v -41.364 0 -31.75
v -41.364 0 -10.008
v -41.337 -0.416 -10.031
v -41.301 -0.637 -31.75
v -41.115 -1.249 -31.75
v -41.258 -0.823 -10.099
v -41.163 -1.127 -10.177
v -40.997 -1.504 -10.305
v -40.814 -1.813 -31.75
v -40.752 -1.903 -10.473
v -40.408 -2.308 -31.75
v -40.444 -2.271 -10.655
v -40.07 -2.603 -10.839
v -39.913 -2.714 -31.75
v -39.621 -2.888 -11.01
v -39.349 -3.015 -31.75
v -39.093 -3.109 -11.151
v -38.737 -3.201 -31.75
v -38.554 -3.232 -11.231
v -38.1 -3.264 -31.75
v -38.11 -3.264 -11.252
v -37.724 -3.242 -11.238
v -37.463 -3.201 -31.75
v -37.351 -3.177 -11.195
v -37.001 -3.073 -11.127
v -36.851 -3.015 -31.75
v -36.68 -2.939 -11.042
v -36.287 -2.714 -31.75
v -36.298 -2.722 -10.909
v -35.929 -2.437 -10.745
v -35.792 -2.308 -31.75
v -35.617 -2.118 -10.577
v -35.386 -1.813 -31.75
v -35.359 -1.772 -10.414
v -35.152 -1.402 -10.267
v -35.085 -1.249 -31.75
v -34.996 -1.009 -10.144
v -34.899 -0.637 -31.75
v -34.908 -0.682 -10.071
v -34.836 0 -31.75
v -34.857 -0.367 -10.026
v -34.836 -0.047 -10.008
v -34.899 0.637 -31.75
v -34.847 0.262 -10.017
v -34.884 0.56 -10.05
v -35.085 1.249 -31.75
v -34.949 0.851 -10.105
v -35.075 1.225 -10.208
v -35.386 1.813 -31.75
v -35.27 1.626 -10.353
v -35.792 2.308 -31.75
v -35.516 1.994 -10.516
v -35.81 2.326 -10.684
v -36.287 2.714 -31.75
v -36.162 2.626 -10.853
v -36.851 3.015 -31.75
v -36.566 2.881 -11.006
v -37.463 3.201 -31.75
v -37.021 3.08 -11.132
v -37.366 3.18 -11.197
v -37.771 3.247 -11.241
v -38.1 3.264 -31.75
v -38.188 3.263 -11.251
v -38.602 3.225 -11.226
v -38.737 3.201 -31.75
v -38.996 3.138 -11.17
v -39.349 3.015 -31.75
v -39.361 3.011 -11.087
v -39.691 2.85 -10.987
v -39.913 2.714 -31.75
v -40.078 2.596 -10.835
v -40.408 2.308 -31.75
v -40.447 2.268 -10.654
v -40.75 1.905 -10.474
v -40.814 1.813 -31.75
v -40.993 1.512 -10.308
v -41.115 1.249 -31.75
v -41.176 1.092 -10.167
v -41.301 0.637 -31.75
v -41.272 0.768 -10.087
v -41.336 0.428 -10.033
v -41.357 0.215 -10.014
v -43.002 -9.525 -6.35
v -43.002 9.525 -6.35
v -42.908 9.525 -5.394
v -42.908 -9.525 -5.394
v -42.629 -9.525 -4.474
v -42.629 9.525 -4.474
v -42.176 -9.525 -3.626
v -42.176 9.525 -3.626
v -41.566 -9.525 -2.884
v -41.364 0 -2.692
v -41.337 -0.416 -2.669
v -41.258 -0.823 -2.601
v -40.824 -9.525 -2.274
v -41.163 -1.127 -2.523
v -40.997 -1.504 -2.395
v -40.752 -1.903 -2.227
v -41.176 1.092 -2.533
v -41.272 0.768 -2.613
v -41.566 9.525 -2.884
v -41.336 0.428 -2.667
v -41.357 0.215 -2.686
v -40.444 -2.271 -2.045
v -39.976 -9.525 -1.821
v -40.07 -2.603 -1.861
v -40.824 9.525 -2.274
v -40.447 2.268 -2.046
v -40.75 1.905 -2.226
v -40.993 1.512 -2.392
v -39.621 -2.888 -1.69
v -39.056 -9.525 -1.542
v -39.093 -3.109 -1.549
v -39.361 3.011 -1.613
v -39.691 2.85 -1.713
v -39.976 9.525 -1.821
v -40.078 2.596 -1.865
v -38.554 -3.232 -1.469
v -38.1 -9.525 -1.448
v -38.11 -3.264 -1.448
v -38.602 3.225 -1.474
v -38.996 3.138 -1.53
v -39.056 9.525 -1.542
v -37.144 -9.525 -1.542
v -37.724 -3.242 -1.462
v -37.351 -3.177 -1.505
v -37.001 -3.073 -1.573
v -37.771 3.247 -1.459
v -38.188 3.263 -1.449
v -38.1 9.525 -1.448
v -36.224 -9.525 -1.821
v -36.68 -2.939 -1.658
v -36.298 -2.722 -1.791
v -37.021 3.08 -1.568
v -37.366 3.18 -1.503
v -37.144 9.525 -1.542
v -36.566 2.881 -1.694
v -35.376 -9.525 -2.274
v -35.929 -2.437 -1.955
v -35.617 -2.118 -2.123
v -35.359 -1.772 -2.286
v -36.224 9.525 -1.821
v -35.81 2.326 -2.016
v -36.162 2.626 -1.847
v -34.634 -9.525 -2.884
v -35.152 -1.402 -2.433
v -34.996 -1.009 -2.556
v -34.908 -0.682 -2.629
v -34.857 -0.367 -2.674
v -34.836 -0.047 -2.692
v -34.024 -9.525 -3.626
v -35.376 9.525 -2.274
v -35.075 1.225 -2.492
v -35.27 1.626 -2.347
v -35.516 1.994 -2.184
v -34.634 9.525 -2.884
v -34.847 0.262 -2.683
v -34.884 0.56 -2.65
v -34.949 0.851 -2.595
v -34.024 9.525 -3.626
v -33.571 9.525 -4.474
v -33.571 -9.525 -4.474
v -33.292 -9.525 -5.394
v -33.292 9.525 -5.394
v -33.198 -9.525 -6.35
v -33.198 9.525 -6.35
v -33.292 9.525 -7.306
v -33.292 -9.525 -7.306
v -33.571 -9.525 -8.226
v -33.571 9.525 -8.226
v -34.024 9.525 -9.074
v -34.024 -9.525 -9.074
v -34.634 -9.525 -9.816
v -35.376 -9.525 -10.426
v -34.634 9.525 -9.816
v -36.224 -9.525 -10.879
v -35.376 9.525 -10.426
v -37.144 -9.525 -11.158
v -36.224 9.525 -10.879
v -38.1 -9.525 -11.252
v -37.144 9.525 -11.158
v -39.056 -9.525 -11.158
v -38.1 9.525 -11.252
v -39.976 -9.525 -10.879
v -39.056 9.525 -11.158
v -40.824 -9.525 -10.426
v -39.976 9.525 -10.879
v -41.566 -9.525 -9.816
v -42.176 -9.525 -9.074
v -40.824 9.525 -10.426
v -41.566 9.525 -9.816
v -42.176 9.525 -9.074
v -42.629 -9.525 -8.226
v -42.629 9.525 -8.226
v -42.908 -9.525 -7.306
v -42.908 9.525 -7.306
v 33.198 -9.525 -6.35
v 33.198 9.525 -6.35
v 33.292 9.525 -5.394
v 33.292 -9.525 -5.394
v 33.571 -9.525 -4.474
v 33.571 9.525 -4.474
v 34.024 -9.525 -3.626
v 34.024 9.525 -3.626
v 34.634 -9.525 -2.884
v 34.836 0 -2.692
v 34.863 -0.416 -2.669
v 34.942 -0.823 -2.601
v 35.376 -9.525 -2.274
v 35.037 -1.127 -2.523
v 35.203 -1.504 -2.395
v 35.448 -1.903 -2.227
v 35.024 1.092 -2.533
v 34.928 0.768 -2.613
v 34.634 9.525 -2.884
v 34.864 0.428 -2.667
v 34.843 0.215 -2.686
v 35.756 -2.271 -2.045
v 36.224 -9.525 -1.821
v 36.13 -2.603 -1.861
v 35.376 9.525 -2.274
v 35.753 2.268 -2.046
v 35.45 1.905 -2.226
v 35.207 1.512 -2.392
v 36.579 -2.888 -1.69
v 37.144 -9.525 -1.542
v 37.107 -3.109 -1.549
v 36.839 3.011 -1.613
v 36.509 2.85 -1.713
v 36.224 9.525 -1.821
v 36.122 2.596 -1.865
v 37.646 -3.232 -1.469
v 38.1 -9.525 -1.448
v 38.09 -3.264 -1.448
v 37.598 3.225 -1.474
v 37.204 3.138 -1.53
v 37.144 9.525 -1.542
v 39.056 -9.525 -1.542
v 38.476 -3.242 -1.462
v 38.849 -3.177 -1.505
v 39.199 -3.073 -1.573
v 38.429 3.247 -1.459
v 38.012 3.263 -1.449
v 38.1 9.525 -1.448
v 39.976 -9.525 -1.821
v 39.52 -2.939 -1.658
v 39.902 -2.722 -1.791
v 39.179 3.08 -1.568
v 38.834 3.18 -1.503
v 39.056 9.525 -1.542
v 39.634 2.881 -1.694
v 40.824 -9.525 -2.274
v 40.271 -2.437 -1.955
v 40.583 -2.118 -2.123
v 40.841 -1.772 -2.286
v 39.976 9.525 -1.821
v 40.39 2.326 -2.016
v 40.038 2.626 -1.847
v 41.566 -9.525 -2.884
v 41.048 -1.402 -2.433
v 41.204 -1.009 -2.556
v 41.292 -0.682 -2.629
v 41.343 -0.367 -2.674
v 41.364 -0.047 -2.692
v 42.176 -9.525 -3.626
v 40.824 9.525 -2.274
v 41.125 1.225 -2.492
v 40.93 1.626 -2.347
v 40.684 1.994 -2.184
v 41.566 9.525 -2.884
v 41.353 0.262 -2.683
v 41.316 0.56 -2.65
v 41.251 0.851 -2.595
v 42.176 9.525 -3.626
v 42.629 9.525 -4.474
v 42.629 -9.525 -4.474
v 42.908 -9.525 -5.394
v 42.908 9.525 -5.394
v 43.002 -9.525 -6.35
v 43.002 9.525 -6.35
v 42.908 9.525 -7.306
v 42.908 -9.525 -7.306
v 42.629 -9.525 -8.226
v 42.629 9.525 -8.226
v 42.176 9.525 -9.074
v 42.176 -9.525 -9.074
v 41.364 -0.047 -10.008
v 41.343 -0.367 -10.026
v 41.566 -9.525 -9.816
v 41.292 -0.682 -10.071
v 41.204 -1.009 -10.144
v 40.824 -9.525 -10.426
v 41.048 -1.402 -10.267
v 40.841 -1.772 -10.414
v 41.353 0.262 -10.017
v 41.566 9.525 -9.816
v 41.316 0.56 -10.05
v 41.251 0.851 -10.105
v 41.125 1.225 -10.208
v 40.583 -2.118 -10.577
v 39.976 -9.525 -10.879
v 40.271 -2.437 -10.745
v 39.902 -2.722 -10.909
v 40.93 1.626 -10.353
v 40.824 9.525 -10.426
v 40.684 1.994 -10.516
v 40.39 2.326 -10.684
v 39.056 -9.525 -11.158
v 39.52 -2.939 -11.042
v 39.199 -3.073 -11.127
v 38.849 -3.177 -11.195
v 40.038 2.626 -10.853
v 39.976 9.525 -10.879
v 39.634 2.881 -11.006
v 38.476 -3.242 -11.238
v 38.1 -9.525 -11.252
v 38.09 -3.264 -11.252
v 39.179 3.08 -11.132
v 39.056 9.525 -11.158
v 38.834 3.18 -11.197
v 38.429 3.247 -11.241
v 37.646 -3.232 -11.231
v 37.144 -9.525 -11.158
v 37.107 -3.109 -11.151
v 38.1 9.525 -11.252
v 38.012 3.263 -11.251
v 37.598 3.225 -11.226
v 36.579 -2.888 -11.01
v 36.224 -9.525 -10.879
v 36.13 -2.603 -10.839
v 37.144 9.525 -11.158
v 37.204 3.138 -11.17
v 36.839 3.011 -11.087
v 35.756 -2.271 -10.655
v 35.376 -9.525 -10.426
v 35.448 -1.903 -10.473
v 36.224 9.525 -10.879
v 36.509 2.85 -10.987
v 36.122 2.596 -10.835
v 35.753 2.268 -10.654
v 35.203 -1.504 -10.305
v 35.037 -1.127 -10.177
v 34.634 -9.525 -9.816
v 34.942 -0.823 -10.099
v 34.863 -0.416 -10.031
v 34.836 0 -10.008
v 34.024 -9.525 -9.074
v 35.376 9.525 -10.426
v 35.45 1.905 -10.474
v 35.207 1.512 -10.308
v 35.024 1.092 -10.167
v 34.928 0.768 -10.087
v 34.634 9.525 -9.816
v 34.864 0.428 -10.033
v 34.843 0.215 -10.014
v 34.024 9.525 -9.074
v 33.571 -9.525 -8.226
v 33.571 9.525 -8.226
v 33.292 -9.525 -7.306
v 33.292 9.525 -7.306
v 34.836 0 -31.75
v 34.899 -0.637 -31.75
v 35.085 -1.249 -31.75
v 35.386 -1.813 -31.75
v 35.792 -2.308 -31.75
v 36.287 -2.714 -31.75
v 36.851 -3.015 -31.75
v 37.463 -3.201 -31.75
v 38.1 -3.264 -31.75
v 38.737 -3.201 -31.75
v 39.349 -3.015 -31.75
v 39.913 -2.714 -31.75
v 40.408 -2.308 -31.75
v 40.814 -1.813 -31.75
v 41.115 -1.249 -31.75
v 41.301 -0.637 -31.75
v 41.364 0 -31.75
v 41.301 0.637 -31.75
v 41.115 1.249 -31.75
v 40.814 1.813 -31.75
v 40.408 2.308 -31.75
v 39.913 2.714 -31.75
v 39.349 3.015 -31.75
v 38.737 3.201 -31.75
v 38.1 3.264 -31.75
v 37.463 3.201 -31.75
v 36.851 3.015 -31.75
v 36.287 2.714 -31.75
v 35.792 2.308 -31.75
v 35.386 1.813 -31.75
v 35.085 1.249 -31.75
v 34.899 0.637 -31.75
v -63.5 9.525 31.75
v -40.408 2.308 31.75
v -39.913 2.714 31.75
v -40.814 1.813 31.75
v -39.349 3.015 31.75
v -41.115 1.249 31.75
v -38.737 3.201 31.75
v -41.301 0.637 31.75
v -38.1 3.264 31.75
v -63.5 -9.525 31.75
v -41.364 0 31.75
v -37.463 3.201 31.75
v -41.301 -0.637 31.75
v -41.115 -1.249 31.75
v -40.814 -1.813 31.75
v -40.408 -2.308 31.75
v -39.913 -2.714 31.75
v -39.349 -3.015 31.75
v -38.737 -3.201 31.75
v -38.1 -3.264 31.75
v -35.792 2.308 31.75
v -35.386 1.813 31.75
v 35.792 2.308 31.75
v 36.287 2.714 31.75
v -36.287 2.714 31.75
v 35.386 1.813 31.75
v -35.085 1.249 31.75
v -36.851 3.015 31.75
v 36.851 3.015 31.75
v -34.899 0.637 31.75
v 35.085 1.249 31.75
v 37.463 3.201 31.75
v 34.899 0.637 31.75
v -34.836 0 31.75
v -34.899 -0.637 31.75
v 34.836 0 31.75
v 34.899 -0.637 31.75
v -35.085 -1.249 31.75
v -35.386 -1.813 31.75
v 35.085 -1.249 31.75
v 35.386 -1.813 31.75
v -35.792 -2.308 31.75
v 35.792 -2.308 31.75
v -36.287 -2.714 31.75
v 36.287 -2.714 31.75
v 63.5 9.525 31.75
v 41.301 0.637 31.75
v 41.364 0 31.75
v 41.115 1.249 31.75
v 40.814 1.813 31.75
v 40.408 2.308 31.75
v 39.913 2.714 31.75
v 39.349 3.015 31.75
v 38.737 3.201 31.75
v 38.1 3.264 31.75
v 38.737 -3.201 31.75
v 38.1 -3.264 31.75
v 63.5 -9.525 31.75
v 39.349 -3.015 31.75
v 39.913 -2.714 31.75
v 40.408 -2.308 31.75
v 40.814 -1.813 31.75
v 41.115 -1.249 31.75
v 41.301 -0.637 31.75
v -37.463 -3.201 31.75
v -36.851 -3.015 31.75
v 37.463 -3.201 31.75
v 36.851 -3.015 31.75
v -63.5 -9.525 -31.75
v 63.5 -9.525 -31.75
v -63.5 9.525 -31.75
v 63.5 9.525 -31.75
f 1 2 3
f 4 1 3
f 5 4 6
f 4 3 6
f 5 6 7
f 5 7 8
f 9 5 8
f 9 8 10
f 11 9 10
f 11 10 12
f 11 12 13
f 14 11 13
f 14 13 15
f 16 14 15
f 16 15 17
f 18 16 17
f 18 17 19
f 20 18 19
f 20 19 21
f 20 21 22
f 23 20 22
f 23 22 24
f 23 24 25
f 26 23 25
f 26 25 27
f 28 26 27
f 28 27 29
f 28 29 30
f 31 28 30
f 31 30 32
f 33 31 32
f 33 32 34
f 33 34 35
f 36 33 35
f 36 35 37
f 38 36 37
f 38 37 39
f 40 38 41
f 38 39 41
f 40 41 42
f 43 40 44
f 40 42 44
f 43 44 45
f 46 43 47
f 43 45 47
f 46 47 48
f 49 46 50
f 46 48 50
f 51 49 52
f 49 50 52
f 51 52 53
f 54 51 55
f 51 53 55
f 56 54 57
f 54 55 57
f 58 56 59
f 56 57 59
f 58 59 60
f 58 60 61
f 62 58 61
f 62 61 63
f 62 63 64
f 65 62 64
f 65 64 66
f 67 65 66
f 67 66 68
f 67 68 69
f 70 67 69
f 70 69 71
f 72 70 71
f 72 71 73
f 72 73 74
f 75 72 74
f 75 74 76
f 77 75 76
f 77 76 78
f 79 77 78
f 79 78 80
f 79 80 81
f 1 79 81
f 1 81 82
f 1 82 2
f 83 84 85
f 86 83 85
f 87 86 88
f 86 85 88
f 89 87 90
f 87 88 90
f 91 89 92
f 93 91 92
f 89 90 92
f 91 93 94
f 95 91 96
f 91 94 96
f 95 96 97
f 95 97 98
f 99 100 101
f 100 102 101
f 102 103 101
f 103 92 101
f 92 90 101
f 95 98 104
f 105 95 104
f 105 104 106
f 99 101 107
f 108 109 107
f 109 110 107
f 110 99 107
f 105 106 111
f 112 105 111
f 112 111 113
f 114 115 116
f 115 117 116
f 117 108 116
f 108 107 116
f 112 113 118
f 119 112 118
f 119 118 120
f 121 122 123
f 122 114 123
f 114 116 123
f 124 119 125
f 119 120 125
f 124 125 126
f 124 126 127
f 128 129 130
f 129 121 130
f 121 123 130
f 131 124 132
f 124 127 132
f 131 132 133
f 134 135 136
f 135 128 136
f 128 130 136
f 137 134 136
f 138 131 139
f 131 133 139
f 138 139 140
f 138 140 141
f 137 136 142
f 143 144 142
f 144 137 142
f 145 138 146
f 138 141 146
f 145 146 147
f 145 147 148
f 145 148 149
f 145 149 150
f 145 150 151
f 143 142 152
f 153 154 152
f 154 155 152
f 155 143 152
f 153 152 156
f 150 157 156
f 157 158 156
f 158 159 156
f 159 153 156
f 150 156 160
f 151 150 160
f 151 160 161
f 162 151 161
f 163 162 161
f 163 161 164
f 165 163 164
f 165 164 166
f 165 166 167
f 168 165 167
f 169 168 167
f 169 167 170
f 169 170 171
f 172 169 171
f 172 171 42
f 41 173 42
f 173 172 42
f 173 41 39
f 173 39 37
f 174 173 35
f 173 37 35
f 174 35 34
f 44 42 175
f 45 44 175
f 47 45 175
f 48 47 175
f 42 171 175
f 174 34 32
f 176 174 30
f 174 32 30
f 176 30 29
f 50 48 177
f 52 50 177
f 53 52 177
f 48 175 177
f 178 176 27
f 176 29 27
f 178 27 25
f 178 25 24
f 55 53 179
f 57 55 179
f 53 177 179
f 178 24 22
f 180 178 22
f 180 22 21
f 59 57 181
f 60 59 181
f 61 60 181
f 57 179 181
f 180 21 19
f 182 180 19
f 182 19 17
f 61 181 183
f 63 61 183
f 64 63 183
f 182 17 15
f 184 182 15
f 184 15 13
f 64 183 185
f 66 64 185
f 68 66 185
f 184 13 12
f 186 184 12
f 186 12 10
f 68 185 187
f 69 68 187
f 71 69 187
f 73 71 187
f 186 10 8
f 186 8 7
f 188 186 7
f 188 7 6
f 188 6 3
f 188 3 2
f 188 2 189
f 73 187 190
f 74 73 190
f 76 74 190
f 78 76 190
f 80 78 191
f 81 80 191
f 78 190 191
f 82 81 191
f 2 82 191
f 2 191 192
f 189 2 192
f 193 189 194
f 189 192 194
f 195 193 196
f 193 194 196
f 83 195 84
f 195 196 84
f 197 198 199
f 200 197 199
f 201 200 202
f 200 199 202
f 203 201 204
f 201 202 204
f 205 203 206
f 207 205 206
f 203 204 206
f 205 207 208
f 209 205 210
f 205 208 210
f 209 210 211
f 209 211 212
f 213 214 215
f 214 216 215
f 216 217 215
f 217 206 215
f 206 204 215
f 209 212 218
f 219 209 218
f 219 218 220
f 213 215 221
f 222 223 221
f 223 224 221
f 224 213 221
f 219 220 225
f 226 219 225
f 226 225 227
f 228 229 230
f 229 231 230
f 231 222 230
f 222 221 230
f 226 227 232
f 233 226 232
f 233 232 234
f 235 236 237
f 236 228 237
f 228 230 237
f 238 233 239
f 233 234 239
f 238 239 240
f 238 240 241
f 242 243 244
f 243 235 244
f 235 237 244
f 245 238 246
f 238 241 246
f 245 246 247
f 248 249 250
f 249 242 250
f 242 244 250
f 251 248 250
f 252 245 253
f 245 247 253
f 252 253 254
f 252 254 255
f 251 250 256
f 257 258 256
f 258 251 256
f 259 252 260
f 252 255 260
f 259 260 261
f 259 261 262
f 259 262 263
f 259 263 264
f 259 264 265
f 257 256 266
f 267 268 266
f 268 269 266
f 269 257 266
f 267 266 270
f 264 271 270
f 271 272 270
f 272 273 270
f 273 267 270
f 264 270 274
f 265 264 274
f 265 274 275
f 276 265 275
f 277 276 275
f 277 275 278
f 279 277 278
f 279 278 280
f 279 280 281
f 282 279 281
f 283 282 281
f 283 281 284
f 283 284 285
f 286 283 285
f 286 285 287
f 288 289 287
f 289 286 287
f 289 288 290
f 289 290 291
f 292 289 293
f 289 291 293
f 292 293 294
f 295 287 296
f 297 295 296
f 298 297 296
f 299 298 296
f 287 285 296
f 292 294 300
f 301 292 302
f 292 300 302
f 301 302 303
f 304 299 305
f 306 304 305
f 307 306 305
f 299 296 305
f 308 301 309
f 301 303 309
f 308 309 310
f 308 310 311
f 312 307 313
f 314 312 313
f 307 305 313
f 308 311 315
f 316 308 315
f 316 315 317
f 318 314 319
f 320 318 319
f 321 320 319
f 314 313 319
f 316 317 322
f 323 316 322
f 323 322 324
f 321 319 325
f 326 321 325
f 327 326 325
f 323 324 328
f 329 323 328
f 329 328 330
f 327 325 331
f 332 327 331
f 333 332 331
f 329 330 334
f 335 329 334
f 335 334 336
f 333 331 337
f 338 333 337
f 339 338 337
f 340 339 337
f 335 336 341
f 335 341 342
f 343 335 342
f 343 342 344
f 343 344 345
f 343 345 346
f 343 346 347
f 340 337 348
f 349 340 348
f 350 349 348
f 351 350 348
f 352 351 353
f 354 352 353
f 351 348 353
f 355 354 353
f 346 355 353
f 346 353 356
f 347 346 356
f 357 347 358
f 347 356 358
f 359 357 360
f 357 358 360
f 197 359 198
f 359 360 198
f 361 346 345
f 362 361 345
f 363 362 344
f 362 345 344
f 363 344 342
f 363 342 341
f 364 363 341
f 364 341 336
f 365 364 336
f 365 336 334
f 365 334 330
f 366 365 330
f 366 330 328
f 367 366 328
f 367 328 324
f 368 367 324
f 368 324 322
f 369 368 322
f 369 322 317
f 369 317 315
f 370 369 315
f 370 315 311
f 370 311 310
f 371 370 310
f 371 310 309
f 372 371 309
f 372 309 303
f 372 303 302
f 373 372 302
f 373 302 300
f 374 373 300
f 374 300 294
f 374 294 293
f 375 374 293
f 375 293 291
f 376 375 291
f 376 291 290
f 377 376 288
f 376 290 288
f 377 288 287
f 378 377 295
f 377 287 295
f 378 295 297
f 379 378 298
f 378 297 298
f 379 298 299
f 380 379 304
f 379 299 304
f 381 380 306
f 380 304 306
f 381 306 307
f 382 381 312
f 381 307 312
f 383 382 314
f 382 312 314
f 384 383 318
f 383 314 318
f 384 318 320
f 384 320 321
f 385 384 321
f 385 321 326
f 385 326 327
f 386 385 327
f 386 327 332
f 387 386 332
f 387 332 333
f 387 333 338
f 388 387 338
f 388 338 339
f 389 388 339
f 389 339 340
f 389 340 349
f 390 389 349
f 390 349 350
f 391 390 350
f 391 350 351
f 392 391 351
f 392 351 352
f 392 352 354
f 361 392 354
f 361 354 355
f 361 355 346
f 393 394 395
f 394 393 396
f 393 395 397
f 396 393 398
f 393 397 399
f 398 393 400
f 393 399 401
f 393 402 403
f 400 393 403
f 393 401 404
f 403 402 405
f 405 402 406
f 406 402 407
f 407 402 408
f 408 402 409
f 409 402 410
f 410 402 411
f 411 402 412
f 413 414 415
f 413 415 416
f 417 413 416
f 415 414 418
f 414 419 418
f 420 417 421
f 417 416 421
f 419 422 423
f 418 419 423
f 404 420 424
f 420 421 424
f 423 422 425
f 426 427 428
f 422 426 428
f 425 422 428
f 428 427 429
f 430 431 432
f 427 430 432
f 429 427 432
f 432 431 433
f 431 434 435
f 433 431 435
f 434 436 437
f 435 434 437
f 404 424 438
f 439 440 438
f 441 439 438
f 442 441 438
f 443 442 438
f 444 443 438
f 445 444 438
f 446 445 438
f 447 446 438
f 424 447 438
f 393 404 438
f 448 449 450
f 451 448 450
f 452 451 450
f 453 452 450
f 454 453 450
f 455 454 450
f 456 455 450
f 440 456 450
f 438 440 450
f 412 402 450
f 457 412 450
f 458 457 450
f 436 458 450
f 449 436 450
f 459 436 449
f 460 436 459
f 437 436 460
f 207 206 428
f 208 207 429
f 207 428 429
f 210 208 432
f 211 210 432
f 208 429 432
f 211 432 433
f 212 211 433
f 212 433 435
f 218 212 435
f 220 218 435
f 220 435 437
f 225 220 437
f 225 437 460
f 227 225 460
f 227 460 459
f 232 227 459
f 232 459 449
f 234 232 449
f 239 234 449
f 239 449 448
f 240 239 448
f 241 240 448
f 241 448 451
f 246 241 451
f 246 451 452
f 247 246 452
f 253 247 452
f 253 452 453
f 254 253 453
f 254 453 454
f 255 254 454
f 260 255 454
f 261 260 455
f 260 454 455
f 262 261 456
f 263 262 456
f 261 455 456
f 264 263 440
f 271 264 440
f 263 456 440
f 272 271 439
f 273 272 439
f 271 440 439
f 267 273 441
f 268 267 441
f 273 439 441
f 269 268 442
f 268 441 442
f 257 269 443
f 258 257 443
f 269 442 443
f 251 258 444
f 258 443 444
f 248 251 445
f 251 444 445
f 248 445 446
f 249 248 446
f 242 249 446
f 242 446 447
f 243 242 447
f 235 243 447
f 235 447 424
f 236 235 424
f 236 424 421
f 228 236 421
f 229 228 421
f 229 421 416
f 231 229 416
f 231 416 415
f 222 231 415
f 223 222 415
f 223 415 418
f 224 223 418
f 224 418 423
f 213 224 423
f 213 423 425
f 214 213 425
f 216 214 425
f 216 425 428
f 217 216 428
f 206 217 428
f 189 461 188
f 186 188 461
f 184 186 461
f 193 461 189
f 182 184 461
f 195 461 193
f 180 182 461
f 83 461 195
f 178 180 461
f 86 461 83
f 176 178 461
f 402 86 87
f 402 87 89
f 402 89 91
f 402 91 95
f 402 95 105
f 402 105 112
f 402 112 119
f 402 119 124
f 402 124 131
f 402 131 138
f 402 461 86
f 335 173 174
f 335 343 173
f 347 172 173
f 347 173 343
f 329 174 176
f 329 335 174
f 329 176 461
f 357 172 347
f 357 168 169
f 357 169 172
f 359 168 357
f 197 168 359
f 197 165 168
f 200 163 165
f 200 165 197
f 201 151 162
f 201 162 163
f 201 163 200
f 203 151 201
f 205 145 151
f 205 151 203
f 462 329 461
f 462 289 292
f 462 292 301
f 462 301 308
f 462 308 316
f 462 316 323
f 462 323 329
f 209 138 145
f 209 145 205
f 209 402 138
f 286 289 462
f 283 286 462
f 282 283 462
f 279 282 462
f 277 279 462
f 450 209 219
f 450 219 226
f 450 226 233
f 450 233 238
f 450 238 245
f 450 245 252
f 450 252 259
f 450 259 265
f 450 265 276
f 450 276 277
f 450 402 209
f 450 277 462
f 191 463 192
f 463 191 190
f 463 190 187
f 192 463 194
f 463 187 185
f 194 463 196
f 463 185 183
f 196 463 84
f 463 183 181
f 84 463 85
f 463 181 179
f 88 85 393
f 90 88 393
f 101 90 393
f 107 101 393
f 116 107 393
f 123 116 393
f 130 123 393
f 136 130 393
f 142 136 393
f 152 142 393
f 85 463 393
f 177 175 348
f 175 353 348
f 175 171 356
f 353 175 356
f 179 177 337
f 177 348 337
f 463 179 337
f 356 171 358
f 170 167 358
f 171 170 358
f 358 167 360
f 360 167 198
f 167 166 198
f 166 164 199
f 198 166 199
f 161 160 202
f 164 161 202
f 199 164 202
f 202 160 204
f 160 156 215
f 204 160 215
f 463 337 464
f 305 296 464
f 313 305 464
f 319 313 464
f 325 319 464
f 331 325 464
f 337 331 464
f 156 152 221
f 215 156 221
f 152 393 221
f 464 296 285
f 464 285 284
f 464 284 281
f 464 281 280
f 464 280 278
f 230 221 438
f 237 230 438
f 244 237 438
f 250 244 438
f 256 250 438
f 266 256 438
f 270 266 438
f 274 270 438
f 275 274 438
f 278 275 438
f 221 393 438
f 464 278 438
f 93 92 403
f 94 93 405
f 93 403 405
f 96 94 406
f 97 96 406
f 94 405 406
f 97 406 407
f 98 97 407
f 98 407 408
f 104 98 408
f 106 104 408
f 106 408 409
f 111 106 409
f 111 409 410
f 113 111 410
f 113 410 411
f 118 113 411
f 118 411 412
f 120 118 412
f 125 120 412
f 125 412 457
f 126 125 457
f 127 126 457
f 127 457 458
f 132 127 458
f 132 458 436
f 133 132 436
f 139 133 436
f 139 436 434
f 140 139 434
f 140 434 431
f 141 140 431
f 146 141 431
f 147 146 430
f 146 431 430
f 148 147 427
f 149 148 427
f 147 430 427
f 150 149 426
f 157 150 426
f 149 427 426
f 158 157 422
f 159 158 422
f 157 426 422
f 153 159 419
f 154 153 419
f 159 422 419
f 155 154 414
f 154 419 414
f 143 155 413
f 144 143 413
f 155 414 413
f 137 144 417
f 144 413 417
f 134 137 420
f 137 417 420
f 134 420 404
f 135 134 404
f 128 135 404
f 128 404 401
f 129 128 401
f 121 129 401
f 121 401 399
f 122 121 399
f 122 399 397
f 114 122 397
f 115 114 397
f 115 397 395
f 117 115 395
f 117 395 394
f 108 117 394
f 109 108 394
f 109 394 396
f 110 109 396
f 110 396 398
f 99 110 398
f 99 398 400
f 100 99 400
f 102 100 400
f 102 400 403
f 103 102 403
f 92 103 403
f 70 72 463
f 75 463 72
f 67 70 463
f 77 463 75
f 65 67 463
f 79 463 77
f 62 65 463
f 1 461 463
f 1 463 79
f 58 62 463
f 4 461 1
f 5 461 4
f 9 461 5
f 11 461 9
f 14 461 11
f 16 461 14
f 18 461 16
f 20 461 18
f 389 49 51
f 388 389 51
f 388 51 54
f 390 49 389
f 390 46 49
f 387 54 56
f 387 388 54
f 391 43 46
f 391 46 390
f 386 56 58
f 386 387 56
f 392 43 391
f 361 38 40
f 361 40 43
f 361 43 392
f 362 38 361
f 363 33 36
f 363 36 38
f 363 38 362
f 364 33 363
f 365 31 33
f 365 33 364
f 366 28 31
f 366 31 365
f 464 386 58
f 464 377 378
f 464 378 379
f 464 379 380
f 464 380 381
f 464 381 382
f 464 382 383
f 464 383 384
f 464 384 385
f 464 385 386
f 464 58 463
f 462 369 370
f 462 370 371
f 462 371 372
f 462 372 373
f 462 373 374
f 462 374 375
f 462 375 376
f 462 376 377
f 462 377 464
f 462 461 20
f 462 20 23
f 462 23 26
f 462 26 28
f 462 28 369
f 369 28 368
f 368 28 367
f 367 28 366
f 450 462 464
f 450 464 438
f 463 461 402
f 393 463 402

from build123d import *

# Parameters (mm, degrees)
F0_W     = 127
F0_H     = 63.5
F1_DEPTH = 9.525
F3_D     = 9.8044
F5_D     = 6.5278


with BuildPart() as f1:
    # F0 (on Front) → F1 (new body, symmetric)
    with BuildSketch(Plane.XZ):
        Rectangle(F0_W, F0_H)
    extrude(amount=F1_DEPTH, both=True)

    # F3 (through all)
    with Locations(Plane.XZ.offset(9.525)):
        with Locations((-38.1, -6.35), (38.1, -6.35)):
            Hole(F3_D / 2)

    # F5 (through all)
    with Locations(Plane(origin=(0, 0, -31.75), x_dir=(1, 0, 0), z_dir=(0, 0, -1))):
        with Locations((-38.1, 0), (38.1, 0)):
            Hole(F5_D / 2)


solid = f1.part
